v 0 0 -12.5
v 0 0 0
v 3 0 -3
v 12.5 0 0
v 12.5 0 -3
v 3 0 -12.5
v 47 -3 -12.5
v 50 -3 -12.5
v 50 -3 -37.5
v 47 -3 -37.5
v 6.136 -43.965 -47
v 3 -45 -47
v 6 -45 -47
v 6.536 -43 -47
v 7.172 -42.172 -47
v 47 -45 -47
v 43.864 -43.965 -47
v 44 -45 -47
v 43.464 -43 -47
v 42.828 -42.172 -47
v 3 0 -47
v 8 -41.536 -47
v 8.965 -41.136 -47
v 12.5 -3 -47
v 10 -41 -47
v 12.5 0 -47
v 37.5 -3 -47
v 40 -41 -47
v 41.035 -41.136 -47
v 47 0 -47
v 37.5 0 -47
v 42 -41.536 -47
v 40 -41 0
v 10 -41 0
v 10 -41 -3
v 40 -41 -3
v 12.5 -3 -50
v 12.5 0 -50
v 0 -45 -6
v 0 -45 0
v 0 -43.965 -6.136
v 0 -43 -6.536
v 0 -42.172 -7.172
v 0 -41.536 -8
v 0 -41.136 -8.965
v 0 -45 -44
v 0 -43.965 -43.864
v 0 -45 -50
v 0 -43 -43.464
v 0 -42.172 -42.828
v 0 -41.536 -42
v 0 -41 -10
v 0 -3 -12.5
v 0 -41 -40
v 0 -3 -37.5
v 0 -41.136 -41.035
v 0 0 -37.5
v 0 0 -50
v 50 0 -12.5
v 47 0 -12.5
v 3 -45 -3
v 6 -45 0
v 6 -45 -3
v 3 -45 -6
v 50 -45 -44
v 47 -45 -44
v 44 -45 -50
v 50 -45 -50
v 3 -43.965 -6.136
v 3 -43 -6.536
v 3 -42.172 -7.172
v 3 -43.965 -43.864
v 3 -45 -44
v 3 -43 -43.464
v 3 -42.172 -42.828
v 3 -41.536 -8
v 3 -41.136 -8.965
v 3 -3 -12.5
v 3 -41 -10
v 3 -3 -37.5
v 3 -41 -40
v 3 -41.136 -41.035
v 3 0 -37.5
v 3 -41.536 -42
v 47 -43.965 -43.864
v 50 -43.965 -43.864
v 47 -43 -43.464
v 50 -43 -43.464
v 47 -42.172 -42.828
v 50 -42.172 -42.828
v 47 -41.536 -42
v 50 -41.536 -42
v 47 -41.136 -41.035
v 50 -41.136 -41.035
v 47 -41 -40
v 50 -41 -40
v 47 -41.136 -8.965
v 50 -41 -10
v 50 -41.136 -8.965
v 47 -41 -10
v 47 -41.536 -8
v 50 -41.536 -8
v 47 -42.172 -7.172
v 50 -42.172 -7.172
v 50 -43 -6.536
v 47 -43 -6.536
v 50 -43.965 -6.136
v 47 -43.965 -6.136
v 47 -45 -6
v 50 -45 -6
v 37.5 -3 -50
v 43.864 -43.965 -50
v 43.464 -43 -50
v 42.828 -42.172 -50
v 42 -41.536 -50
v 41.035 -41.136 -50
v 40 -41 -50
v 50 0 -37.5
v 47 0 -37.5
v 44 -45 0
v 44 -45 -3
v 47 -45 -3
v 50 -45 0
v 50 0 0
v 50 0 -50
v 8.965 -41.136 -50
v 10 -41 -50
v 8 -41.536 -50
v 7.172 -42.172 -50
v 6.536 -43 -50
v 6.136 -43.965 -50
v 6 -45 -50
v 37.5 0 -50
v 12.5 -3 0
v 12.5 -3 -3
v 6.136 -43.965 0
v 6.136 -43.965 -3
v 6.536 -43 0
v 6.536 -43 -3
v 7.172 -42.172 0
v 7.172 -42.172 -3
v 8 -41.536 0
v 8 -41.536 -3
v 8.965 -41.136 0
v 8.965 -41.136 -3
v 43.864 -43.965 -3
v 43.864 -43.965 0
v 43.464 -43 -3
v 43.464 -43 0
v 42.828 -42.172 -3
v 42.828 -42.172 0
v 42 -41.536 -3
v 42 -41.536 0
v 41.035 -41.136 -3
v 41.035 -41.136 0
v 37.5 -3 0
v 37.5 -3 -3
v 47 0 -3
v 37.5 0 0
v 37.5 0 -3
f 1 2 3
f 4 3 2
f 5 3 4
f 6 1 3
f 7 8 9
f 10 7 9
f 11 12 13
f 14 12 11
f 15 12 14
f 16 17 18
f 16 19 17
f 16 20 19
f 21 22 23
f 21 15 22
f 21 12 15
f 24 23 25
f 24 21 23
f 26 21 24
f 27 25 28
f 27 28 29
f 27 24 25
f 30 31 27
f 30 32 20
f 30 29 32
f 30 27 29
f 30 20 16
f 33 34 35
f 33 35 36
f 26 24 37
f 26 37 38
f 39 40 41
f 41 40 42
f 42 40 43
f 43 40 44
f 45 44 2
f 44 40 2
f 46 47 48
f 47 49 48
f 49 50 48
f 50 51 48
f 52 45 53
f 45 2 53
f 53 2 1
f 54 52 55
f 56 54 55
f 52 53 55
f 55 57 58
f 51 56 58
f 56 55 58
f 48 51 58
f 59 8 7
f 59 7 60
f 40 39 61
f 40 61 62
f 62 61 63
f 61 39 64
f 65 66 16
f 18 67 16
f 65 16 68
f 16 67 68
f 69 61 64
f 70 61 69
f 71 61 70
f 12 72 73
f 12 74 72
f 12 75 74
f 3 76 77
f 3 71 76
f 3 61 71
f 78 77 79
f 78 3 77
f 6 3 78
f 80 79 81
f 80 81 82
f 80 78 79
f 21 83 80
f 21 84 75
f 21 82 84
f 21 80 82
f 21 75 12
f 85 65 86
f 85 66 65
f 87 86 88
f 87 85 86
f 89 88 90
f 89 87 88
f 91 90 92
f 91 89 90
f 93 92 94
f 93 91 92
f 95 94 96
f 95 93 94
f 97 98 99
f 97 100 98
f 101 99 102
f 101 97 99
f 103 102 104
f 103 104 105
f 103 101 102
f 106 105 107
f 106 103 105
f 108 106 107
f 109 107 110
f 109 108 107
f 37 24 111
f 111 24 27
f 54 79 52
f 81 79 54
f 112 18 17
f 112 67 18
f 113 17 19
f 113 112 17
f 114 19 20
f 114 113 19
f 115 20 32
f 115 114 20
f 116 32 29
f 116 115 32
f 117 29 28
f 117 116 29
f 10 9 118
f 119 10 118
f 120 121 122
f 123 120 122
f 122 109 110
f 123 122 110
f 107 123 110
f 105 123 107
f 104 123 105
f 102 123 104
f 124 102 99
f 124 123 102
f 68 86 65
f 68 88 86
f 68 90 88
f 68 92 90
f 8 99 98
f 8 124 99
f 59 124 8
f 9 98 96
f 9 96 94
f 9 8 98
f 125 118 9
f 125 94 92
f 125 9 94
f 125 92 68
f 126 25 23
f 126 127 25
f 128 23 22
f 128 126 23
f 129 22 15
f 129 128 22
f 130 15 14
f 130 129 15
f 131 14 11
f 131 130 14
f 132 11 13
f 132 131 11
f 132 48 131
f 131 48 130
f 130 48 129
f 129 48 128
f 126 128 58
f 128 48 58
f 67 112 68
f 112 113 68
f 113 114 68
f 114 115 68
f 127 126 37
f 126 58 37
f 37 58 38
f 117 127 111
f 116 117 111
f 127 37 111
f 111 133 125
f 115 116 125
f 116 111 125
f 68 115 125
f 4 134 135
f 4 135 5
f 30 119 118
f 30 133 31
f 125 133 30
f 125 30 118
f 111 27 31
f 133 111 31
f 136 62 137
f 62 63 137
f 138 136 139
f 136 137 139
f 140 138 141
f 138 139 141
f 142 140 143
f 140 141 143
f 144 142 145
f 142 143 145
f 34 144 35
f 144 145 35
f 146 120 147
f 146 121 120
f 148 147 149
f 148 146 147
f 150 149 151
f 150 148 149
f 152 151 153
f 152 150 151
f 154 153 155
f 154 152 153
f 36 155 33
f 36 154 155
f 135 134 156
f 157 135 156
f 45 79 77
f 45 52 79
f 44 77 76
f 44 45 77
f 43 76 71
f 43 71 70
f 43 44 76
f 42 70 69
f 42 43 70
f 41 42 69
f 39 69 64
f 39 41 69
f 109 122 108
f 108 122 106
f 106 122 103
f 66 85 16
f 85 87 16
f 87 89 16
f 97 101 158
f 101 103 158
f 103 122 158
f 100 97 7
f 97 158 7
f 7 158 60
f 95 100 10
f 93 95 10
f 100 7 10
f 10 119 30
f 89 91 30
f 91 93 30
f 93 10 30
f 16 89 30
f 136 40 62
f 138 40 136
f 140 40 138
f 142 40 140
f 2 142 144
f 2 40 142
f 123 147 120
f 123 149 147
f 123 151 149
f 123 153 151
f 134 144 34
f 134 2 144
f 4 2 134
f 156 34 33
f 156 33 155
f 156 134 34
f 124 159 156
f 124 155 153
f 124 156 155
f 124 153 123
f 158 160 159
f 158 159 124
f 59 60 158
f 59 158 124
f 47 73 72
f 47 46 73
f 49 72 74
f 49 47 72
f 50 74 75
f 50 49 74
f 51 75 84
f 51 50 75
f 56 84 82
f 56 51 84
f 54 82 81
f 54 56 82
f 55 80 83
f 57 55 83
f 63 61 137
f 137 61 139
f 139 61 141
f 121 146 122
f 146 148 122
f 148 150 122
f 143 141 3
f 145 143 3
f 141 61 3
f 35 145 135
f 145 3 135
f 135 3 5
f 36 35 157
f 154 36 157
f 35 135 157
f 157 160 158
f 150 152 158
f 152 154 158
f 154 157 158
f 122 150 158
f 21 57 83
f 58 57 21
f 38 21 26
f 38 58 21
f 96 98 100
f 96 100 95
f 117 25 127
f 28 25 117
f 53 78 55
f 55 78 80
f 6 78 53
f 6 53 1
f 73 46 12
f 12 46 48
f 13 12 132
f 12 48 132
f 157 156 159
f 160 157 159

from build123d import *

# Parameters (mm, degrees)
ESQUISSE2_W             = 50
ESQUISSE2_H             = 50
BOSS_EXTRU_2_DEPTH      = 45
ESQUISSE4_W             = 44
ESQUISSE4_H             = 44
ENL_V_MAT_EXTRU_3_DEPTH = 45
ESQUISSE5_W             = 25
ESQUISSE5_H             = 3
ENL_V_MAT_EXTRU_4_DEPTH = 57
ESQUISSE6_W             = 25
ESQUISSE6_H             = 3
ENL_V_MAT_EXTRU_5_DEPTH = 57
ESQUISSE7_W             = 38
ESQUISSE7_H             = 4
ENL_V_MAT_EXTRU_6_DEPTH = 57
ESQUISSE8_W             = 38
ESQUISSE8_H             = 4
ENL_V_MAT_EXTRU_7_DEPTH = 57
CONG_1_R                = 4


with BuildPart() as part:
    # Esquisse2 → Boss.-Extru.2 (new body)
    with BuildSketch(Plane(origin=(0, 0, 0), x_dir=(1, 0, 0), z_dir=(0, 1, 0))):
        with Locations((25, 25)):
            Rectangle(ESQUISSE2_W, ESQUISSE2_H)
    extrude(amount=-BOSS_EXTRU_2_DEPTH)

    # Esquisse4 → Enlèv. mat.-Extru.3 (cut)
    with BuildSketch(Plane(origin=(0, 0, 0), x_dir=(1, 0, 0), z_dir=(0, 1, 0))):
        with Locations((25, 25)):
            Rectangle(ESQUISSE4_W, ESQUISSE4_H)
    extrude(amount=-ENL_V_MAT_EXTRU_3_DEPTH, mode=Mode.SUBTRACT)

    # Esquisse5 → Enlèv. mat.-Extru.4 (cut)
    with BuildSketch(Plane.XY):
        with Locations((25, -1.5)):
            Rectangle(ESQUISSE5_W, ESQUISSE5_H)
    extrude(amount=-ENL_V_MAT_EXTRU_4_DEPTH, mode=Mode.SUBTRACT)

    # Esquisse6 → Enlèv. mat.-Extru.5 (cut)
    with BuildSketch(Plane(origin=(50, 0, 0), x_dir=(0, 0, -1), z_dir=(1, 0, 0))):
        with Locations((25, -1.5)):
            Rectangle(ESQUISSE6_W, ESQUISSE6_H)
    extrude(amount=-ENL_V_MAT_EXTRU_5_DEPTH, mode=Mode.SUBTRACT)

    # Esquisse7 → Enlèv. mat.-Extru.6 (cut)
    with BuildSketch(Plane.XY):
        with Locations((25, -43)):
            Rectangle(ESQUISSE7_W, ESQUISSE7_H)
    extrude(amount=-ENL_V_MAT_EXTRU_6_DEPTH, mode=Mode.SUBTRACT)

    # Esquisse8 → Enlèv. mat.-Extru.7 (cut)
    with BuildSketch(Plane(origin=(50, 0, 0), x_dir=(0, 0, -1), z_dir=(1, 0, 0))):
        with Locations((25, -43)):
            Rectangle(ESQUISSE8_W, ESQUISSE8_H)
    extrude(amount=-ENL_V_MAT_EXTRU_7_DEPTH, mode=Mode.SUBTRACT)

    # Congé1
    cong_1_edges = [part.edges().sort_by_distance(p)[0] for p in [
        (44, -41, -48.5),
        (44, -41, -1.5),
        (6, -41, -1.5),
        (1.5, -41, -6),
        (1.5, -41, -44),
        (6, -41, -48.5),
        (48.5, -41, -44),
        (48.5, -41, -6),
    ]]
    fillet(cong_1_edges, radius=CONG_1_R - 0.0001)  # a hair under: the kernel refuses the full size


solid = part.part
